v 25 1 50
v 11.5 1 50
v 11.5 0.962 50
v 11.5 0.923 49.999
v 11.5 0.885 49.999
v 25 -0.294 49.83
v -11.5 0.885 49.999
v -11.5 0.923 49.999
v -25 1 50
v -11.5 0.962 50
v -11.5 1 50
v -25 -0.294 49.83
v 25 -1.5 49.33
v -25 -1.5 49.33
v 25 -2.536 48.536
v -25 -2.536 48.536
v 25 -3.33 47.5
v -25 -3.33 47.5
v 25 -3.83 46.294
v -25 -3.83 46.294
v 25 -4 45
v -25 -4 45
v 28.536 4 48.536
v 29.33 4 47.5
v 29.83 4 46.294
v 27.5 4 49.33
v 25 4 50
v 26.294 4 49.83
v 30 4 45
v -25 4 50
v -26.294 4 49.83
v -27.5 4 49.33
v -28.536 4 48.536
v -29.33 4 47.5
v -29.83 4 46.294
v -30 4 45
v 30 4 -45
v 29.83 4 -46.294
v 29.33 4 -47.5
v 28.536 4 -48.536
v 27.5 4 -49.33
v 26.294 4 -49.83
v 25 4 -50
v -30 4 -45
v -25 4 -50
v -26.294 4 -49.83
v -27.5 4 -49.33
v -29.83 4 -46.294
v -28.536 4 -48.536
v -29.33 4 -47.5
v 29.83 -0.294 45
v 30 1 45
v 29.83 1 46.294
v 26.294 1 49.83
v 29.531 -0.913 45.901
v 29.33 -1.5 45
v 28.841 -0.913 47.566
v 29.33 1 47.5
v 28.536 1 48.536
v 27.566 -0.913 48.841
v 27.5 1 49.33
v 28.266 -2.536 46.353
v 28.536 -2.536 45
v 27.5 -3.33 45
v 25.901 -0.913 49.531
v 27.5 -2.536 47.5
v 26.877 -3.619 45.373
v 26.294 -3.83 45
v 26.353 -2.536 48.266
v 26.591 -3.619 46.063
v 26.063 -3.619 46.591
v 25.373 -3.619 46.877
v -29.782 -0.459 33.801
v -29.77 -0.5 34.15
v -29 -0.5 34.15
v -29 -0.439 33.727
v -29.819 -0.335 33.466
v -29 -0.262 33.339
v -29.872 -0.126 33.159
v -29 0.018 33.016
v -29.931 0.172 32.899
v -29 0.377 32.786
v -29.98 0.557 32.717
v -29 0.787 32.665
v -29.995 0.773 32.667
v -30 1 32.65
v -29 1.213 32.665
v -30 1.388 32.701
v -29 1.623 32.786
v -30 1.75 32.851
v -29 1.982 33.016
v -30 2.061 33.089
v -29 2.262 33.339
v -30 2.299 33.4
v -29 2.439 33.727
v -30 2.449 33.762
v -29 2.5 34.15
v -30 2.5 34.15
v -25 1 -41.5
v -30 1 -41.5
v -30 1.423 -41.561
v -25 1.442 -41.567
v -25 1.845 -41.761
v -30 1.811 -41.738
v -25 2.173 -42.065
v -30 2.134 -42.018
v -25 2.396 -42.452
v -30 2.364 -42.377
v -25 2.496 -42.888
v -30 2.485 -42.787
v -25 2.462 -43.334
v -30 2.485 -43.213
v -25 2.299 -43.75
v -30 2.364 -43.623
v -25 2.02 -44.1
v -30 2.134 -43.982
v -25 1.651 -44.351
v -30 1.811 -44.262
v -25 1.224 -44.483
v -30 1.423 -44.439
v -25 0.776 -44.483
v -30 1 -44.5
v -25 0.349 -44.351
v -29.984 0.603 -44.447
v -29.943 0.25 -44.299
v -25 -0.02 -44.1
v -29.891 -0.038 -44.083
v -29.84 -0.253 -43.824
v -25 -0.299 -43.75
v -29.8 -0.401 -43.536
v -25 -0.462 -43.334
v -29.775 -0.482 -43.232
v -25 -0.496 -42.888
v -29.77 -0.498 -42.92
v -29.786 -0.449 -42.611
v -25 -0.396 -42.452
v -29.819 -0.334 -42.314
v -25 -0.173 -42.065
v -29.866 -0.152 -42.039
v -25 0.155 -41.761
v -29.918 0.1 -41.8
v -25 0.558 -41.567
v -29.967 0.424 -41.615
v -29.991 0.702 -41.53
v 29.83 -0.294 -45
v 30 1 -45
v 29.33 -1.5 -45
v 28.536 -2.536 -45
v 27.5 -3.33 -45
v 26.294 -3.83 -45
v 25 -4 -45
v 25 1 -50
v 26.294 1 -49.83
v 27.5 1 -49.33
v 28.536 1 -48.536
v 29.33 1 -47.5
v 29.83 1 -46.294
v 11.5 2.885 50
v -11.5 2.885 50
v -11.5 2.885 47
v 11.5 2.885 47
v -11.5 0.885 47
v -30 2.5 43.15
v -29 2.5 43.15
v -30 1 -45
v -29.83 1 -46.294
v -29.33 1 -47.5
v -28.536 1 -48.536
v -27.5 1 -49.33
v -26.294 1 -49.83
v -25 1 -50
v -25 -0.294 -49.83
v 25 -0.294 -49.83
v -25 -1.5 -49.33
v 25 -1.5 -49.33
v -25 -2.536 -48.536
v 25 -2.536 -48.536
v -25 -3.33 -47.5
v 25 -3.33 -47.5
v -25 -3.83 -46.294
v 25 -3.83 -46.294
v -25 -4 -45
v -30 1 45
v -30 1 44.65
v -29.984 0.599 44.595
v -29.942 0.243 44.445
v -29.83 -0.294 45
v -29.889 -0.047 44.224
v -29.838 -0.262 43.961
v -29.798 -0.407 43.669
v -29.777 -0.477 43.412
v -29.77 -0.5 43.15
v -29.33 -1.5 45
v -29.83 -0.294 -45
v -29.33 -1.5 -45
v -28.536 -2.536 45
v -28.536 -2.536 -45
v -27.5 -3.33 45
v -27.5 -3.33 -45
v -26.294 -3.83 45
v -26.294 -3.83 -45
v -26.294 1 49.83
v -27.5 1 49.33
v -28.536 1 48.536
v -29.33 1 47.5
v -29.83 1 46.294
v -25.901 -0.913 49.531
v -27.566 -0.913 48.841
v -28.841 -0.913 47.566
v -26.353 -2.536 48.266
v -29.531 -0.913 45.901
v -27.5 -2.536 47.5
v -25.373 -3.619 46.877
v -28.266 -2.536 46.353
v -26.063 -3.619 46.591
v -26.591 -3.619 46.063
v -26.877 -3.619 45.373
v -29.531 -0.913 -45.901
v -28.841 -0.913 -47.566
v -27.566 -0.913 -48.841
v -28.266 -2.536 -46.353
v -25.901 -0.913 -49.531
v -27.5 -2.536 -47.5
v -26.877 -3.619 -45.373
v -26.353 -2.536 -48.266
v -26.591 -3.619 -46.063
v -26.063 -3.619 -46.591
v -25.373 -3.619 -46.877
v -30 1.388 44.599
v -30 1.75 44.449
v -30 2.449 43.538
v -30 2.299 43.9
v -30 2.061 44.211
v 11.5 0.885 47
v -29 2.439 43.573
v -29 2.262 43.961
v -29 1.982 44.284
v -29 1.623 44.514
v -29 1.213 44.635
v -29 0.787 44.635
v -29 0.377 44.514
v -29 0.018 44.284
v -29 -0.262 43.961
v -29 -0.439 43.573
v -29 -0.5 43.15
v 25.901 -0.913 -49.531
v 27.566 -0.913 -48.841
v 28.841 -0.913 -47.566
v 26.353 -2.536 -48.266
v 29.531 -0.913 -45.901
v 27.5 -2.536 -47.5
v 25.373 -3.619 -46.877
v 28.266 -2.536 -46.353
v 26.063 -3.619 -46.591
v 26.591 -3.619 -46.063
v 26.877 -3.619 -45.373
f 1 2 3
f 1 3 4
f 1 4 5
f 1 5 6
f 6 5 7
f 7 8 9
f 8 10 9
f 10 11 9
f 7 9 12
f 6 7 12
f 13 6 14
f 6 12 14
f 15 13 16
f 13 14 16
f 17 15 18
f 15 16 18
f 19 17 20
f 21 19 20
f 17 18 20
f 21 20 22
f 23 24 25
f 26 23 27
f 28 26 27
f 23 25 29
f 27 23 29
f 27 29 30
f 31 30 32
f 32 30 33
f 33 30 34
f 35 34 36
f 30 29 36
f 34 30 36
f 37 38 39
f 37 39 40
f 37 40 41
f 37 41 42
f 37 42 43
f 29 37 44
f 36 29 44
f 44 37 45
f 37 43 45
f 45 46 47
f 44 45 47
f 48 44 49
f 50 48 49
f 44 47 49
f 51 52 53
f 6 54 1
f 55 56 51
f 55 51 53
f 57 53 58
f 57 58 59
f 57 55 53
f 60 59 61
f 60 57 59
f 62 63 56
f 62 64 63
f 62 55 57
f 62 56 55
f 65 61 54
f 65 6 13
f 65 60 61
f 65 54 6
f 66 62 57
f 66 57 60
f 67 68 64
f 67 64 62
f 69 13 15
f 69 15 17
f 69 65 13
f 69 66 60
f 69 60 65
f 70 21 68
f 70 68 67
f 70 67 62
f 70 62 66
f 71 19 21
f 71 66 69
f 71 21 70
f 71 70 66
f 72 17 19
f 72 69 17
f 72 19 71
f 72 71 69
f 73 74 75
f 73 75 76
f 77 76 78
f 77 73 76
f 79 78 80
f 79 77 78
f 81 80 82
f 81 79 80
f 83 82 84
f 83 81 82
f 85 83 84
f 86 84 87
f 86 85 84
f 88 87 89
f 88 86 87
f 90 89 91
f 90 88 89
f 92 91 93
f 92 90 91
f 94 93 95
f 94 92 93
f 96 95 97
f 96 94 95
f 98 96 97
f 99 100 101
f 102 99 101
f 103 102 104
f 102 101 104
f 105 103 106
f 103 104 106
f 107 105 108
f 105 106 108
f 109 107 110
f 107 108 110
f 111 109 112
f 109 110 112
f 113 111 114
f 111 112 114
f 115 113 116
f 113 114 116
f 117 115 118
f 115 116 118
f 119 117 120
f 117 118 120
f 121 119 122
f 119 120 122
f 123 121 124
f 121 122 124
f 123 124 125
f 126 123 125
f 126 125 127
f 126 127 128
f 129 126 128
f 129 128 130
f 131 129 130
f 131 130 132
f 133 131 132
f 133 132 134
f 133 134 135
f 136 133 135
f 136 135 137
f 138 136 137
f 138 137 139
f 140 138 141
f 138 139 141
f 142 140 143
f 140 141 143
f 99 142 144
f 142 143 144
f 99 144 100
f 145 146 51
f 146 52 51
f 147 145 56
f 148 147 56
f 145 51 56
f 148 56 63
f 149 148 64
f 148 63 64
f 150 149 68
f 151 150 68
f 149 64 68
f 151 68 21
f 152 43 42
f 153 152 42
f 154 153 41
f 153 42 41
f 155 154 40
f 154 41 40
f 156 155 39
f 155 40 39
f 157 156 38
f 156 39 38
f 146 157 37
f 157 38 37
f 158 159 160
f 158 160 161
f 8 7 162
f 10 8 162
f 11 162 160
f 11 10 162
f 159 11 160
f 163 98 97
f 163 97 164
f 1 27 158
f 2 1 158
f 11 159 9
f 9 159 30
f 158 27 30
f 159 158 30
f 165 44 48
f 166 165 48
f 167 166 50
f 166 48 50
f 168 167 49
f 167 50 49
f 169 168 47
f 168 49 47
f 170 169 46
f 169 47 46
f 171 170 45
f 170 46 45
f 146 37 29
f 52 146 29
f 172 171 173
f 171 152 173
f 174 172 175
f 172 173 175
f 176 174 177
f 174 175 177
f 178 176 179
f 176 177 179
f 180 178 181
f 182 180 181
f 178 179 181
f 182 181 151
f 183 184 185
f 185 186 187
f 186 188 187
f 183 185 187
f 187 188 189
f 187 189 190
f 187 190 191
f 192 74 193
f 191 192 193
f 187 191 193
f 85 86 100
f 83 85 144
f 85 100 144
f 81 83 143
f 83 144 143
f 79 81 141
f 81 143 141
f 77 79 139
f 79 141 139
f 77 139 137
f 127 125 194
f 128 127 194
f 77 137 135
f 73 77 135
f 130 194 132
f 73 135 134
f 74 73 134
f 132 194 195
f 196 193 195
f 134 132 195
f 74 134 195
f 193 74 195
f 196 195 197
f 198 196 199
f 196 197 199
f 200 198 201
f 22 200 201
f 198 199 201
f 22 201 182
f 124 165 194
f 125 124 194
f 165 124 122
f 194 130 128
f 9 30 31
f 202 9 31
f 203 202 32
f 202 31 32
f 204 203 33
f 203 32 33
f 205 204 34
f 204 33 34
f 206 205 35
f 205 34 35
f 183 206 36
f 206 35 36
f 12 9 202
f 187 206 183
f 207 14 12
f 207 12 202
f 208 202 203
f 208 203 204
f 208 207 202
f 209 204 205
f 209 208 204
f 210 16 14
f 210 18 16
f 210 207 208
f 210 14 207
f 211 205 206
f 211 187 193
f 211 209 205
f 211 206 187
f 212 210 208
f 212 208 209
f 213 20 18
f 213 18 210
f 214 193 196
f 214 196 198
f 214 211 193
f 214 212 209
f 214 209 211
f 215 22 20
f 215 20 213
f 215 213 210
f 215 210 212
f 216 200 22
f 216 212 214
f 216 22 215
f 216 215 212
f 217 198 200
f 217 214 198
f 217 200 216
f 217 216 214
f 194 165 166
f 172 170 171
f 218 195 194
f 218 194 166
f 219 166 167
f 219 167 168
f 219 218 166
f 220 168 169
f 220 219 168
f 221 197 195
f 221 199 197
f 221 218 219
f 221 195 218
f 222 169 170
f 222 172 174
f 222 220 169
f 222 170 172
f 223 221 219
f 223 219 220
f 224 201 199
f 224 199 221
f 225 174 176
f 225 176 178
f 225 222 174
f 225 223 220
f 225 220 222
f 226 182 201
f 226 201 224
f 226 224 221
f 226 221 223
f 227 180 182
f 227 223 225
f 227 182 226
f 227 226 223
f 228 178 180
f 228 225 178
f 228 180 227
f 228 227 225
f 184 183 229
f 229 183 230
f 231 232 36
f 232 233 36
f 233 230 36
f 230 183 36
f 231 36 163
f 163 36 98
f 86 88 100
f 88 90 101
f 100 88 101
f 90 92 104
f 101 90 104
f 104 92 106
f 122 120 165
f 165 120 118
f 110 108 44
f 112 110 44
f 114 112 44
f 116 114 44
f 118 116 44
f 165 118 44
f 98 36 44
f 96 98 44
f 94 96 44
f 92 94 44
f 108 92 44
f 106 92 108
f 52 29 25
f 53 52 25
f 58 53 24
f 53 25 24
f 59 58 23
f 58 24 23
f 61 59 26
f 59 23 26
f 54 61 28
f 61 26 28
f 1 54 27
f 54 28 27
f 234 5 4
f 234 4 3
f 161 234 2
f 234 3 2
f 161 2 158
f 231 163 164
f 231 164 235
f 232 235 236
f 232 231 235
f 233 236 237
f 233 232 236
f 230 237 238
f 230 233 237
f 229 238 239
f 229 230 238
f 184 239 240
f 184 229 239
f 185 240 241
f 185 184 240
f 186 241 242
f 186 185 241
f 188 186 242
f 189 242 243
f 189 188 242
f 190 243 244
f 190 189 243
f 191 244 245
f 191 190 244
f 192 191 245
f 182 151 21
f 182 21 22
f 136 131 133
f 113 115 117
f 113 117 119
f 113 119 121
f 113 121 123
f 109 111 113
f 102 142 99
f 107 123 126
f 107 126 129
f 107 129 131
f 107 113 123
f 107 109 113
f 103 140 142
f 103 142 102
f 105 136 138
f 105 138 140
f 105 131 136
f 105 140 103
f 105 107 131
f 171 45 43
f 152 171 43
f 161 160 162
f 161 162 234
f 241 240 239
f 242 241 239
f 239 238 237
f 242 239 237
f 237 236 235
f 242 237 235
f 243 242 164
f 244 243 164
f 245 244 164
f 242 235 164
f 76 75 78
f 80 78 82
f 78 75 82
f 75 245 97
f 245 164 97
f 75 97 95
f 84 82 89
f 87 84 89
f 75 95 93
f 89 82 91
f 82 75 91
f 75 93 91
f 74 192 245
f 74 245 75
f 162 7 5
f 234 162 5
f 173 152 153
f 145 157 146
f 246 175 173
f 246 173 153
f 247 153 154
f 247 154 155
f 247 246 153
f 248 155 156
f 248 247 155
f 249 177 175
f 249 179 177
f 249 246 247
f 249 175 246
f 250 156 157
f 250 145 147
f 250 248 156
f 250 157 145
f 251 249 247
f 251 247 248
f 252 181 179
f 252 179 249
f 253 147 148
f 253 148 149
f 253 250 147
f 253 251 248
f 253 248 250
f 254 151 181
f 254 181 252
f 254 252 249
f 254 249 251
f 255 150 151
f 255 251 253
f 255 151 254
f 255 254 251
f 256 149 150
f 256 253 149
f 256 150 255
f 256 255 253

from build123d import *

# Parameters (mm, degrees)
BOSS_EXTRUDE1_DEPTH = 4
FILLET1_R           = 5
SKETCH4_W           = 23
SKETCH4_H           = 2
CUT_EXTRUDE1_DEPTH  = 3
SKETCH5_R           = 1.5
CUT_EXTRUDE2_DEPTH  = 5
CUT_EXTRUDE3_DEPTH  = 1


with BuildPart() as part:
    # Sketch1 → Boss-Extrude1 (new, symmetric)
    with BuildSketch(Plane(origin=(0, 0, 0), x_dir=(1, 0, 0), z_dir=(0, 1, 0))):
        with BuildLine():
            Line((25, -50), (-25, -50))
            ThreePointArc((-25, -50), (-28.535533906, -48.535533906), (-30, -45))
            Line((-30, -45), (-30, 45))
            ThreePointArc((-30, 45), (-28.535533906, 48.535533906), (-25, 50))
            Line((-25, 50), (25, 50))
            ThreePointArc((25, 50), (28.535533906, 48.535533906), (30, 45))
            Line((30, 45), (30, -45))
            ThreePointArc((30, -45), (28.535533906, -48.535533906), (25, -50))
        make_face()
    extrude(amount=BOSS_EXTRUDE1_DEPTH, both=True)

    # Fillet1
    fillet1_edges = [part.edges().sort_by_distance(p)[0] for p in [
        (0, -4, -50),
        (28.535533906, -4, -48.535533906),
        (30, -4, 0),
        (28.535533906, -4, 48.535533906),
        (0, -4, 50),
        (-28.535533906, -4, 48.535533906),
        (-30, -4, 0),
        (-28.535533906, -4, -48.535533906),
    ]]
    fillet(fillet1_edges, radius=FILLET1_R)

    # Sketch4 → Cut-Extrude1 (cut)
    with BuildSketch(Plane.XY.offset(50)):
        with Locations((0, 1.884621544)):
            Rectangle(SKETCH4_W, SKETCH4_H)
    extrude(amount=-CUT_EXTRUDE1_DEPTH, mode=Mode.SUBTRACT)

    # Sketch5 → Cut-Extrude2 (cut)
    with BuildSketch(Plane.ZY.offset(30)):
        with Locations((-43, 1)):
            Circle(SKETCH5_R)
    extrude(amount=-CUT_EXTRUDE2_DEPTH, mode=Mode.SUBTRACT)

    # Sketch6 → Cut-Extrude3 (cut)
    with BuildSketch(Plane.ZY.offset(30)):
        with BuildLine():
            Line((34.15, 2.5), (43.15, 2.5))
            ThreePointArc((43.15, 2.5), (44.65, 1), (43.15, -0.5))
            Line((43.15, -0.5), (34.15, -0.5))
            ThreePointArc((34.15, -0.5), (32.65, 1), (34.15, 2.5))
        make_face()
    extrude(amount=-CUT_EXTRUDE3_DEPTH, mode=Mode.SUBTRACT)


solid = part.part
